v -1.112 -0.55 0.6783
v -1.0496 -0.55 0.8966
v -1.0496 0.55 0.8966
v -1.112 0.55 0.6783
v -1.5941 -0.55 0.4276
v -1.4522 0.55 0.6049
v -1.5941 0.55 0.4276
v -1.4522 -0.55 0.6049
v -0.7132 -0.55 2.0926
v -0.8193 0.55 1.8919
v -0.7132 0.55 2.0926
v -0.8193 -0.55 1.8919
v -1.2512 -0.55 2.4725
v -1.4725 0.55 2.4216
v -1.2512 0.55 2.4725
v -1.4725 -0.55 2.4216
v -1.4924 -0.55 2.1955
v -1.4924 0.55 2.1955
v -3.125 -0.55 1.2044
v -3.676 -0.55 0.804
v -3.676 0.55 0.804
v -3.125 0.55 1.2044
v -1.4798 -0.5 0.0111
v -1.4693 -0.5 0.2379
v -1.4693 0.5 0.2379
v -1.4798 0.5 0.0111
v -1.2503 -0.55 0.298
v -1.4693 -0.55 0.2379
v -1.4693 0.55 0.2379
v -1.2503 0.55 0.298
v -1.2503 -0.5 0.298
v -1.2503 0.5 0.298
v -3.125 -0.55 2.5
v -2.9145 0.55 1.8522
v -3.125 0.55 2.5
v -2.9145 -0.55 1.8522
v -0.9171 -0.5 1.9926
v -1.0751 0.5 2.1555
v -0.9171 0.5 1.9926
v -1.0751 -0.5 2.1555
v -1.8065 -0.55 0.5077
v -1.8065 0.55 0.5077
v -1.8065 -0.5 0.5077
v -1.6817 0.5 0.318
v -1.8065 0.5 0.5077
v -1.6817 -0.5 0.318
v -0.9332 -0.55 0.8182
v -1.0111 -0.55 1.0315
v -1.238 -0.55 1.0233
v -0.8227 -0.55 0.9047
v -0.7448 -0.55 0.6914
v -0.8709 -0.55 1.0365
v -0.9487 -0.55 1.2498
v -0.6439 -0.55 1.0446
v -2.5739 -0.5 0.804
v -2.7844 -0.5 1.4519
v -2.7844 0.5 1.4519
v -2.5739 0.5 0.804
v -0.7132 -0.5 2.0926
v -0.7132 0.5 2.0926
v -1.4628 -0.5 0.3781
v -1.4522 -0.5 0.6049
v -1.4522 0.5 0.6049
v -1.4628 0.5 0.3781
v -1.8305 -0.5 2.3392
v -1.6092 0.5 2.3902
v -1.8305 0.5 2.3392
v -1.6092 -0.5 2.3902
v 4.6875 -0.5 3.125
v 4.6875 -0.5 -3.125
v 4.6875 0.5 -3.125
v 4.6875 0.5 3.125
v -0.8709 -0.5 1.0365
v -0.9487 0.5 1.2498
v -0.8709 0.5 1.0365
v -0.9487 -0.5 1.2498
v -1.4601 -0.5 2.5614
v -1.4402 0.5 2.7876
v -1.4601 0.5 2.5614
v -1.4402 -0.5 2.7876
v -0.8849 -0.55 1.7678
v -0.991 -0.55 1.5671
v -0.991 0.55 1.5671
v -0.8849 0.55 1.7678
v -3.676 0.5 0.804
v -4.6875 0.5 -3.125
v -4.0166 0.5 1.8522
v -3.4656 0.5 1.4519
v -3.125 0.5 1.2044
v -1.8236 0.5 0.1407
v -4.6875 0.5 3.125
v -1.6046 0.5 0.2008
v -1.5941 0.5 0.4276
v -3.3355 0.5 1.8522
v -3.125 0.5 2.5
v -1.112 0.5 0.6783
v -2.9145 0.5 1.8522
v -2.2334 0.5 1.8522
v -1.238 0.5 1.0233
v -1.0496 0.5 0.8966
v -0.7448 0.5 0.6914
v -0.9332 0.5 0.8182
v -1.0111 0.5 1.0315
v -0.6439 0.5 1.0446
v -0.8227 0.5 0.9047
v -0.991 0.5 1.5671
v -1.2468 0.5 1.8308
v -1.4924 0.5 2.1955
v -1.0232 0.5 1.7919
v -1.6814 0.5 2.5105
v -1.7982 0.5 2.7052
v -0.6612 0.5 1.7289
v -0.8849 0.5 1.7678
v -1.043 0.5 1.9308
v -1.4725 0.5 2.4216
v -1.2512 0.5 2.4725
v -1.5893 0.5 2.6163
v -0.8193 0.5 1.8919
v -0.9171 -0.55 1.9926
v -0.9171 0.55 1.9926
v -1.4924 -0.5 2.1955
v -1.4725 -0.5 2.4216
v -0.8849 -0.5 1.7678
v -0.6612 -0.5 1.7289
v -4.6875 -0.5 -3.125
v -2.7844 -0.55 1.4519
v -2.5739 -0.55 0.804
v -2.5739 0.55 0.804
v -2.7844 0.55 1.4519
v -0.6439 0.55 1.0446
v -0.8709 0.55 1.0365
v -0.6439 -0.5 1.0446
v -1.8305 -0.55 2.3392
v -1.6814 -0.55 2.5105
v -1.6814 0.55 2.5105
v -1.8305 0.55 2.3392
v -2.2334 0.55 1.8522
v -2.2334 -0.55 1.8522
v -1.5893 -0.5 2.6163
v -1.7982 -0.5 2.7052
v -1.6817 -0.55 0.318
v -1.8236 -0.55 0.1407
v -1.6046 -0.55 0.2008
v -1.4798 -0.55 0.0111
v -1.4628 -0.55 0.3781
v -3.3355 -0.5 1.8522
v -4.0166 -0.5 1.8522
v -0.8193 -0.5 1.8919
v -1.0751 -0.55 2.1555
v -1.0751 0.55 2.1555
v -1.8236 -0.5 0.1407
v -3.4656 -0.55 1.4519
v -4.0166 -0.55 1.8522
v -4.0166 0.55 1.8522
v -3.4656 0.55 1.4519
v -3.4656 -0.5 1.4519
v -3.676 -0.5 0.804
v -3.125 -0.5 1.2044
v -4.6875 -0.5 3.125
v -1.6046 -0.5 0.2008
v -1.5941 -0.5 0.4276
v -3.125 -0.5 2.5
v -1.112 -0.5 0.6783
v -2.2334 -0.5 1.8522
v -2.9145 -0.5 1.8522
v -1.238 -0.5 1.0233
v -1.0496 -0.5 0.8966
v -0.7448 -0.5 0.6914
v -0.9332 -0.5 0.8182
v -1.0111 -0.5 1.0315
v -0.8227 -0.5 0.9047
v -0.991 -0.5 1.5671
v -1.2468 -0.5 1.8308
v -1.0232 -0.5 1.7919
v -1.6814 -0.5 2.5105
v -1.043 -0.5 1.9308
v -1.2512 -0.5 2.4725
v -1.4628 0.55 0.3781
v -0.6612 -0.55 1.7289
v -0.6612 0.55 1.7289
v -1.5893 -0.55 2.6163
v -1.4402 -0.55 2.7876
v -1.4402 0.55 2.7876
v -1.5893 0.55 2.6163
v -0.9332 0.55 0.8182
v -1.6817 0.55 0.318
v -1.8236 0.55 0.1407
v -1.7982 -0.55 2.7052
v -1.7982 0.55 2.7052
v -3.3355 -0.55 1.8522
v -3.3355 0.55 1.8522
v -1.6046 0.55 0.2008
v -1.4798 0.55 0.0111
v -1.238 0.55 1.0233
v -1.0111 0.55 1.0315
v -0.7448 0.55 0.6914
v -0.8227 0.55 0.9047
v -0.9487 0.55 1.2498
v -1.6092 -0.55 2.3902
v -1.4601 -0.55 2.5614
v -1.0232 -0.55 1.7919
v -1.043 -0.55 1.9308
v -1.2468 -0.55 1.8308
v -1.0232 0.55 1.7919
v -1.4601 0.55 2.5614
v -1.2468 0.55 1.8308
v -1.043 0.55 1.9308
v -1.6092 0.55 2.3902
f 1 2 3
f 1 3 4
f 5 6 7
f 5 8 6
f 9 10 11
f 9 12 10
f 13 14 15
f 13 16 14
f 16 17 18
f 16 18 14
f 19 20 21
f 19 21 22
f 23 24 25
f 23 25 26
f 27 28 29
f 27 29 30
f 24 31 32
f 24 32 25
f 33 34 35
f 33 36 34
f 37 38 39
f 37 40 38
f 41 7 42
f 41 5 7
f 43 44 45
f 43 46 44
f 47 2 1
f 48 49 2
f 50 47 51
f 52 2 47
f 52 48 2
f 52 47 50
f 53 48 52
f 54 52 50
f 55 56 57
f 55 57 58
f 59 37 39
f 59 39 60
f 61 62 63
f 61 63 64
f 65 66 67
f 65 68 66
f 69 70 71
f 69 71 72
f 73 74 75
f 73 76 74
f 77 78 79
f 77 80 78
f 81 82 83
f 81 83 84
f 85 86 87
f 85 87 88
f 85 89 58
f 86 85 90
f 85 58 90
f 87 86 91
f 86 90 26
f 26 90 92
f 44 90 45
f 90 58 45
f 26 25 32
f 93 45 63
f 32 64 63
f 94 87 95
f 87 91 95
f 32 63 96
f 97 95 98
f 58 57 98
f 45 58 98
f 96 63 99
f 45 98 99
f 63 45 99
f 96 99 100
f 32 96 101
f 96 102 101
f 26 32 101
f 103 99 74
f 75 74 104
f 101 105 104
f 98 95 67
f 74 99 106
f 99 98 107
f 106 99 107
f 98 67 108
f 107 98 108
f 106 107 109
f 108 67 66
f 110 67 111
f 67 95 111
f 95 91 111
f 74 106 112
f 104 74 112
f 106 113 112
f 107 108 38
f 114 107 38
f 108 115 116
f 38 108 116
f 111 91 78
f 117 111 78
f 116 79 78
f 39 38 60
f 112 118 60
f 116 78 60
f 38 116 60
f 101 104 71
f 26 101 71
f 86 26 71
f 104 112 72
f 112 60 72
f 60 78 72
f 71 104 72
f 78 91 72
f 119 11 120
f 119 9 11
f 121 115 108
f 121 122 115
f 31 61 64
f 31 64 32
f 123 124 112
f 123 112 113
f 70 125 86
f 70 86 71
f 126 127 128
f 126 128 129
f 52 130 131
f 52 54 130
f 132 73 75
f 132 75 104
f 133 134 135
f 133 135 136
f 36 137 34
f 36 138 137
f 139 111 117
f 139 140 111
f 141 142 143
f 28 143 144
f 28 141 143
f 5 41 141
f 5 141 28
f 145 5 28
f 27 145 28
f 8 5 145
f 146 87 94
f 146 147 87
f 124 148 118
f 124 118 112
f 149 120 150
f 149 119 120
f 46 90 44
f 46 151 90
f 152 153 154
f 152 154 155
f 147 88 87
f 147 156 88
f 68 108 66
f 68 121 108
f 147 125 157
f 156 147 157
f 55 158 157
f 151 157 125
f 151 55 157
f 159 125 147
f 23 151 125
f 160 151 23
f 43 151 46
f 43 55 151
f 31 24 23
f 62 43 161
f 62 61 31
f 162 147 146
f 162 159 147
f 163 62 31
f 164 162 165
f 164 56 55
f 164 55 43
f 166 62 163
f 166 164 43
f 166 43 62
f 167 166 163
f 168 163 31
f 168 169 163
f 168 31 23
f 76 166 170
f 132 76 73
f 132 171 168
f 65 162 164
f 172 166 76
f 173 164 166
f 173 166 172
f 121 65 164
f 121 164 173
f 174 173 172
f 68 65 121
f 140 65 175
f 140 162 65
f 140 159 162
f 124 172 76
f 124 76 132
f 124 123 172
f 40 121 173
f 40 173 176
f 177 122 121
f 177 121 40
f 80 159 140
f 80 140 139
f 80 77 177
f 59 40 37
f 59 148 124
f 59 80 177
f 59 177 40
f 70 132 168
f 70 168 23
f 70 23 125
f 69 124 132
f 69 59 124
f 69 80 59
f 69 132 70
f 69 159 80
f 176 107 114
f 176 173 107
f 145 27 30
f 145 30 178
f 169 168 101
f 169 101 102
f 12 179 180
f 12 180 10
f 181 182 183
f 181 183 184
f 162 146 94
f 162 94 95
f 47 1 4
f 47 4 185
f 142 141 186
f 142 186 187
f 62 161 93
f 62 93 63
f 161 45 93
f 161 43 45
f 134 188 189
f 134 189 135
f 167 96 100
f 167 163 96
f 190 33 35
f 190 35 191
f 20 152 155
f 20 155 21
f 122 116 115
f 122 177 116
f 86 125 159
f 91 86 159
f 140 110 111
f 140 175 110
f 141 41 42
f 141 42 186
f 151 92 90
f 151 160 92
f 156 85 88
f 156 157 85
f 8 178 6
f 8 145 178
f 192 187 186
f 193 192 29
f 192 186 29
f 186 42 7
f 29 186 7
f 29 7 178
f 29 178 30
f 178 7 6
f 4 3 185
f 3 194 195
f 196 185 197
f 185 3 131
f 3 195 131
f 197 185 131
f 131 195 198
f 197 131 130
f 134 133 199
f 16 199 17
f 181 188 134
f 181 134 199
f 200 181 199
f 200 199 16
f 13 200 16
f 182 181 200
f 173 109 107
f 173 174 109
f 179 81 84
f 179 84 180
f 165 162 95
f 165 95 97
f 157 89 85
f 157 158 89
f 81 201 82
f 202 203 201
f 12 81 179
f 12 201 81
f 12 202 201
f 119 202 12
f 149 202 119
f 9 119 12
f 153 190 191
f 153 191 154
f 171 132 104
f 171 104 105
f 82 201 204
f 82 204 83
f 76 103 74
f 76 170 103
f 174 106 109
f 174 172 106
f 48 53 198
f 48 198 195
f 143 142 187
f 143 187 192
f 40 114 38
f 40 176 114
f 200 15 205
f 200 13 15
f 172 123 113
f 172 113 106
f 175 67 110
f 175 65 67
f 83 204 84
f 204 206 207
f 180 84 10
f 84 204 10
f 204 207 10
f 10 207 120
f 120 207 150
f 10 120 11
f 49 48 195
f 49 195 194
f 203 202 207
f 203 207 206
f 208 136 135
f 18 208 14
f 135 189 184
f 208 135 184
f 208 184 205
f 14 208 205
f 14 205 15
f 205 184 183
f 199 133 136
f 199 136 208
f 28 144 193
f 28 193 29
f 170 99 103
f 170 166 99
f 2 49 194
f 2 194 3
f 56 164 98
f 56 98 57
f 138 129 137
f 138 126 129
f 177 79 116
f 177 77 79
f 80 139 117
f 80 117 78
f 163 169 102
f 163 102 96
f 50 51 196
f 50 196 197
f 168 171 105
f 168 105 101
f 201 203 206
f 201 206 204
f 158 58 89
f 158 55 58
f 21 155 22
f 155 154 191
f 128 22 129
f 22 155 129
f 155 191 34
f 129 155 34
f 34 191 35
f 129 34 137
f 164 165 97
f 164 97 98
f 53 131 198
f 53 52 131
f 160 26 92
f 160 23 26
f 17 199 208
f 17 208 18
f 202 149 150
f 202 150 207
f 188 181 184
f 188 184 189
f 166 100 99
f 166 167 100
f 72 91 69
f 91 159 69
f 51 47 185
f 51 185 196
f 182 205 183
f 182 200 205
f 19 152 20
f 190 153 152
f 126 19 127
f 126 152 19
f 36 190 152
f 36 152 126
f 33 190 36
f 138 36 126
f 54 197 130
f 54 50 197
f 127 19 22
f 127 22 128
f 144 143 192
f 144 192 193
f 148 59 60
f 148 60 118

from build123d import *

# Parameters (mm, degrees)
F0_W     = 9.375
F0_H     = 6.25
F1_DEPTH = 0.5
F2_DEPTH = 0.55


with BuildPart() as f1:
    # F0 (on Front) → F1 (new body, symmetric)
    with BuildSketch(Plane.XZ):
        Rectangle(F0_W, F0_H)
        Polygon((-1.5940887542, 0.4276162778), (-1.45225, 0.60493), (-1.4627809703, 0.3781111587), (-1.25032, 0.29801), (-1.4692891501, 0.2379362482), (-1.47982, 0.01112), (-1.6046177776, 0.2008091077), (-1.82357, 0.14074), (-1.6817436333, 0.3180382365), (-1.80653, 0.50771), align=None, mode=Mode.SUBTRACT)
        Polygon((-0.8708636636, 1.0365052502), (-0.64393, 1.04465), (-0.8227314344, 0.9046887114), (-0.74485, 0.6914), (-0.933221672, 0.8181997183), (-1.11197, 0.67828), (-1.0496266799, 0.8965560977), (-1.23796, 1.02333), (-1.011092323, 1.0314723815), (-0.94874, 1.24978), align=None, mode=Mode.SUBTRACT)
        Polygon((-3.3354794214, 1.85221), (-3.125, 2.5), (-2.914516759, 1.85221), (-2.2334, 1.85221), (-2.7844309261, 1.4518536518), (-2.57394, 0.80404), (-3.1249971008, 1.204412313), (-3.67605, 0.80404), (-3.4655634626, 1.4518519009), (-4.016601, 1.85221), align=None, mode=Mode.SUBTRACT)
        Polygon((-0.9170624909, 1.9925929856), (-0.71322, 2.09261), (-0.8193476982, 1.8918681334), (-0.66124, 1.72889), (-0.8849342003, 1.7678104455), (-0.99104, 1.56711), (-1.0231619648, 1.7918606272), (-1.24685, 1.83078), (-1.043018366, 1.9307916874), (-1.07514, 2.15554), align=None, mode=Mode.SUBTRACT)
        Polygon((-1.5892924054, 2.6163223665), (-1.44021, 2.7876), (-1.460146995, 2.5614016312), (-1.25119, 2.47254), (-1.4724668983, 2.421624196), (-1.4924, 2.19547), (-1.6092180103, 2.3901577715), (-1.83046, 2.33925), (-1.681416449, 2.5104829945), (-1.79824, 2.70518), align=None, mode=Mode.SUBTRACT)
    extrude(amount=F1_DEPTH, both=True)


with BuildPart() as f2:
    # F0 (on Front) → F2 (new body, symmetric)
    with BuildSketch(Plane.XZ):
        Polygon((-2.7844309261, 1.4518536518), (-2.914516759, 1.85221), (-3.3354794214, 1.85221), (-3.4655634626, 1.4518519009), (-3.1249971008, 1.204412313), align=None)
        Polygon((-2.914516759, 1.85221), (-3.125, 2.5), (-3.3354794214, 1.85221), align=None)
        Polygon((-2.2334, 1.85221), (-2.914516759, 1.85221), (-2.7844309261, 1.4518536518), align=None)
        Polygon((-3.4655634626, 1.4518519009), (-3.3354794214, 1.85221), (-4.016601, 1.85221), align=None)
        Polygon((-3.1249971008, 1.204412313), (-3.4655634626, 1.4518519009), (-3.67605, 0.80404), align=None)
        Polygon((-2.57394, 0.80404), (-2.7844309261, 1.4518536518), (-3.1249971008, 1.204412313), align=None)
    extrude(amount=F2_DEPTH, both=True)


with BuildPart() as f2b:
    # F0 (on Front) → F2, piece 2 (new body, symmetric)
    with BuildSketch(Plane.XZ):
        Polygon((-1.6817436333, 0.3180382365), (-1.5940887542, 0.4276162778), (-1.80653, 0.50771), align=None)
        Polygon((-1.4627809703, 0.3781111587), (-1.45225, 0.60493), (-1.5940887542, 0.4276162778), align=None)
        Polygon((-1.25032, 0.29801), (-1.4627809703, 0.3781111587), (-1.4692891501, 0.2379362482), align=None)
        Polygon((-1.47982, 0.01112), (-1.4692891501, 0.2379362482), (-1.6046177776, 0.2008091077), align=None)
        Polygon((-1.4692891501, 0.2379362482), (-1.4627809703, 0.3781111587), (-1.5940887542, 0.4276162778), (-1.6817436333, 0.3180382365), (-1.6046177776, 0.2008091077), align=None)
        Polygon((-1.6046177776, 0.2008091077), (-1.6817436333, 0.3180382365), (-1.82357, 0.14074), align=None)
    extrude(amount=F2_DEPTH, both=True)


with BuildPart() as f2c:
    # F0 (on Front) → F2, piece 3 (new body, symmetric)
    with BuildSketch(Plane.XZ):
        Polygon((-0.933221672, 0.8181997183), (-0.8227314344, 0.9046887114), (-0.8708636636, 1.0365052502), (-1.011092323, 1.0314723815), (-1.0496266799, 0.8965560977), align=None)
        Polygon((-0.74485, 0.6914), (-0.8227314344, 0.9046887114), (-0.933221672, 0.8181997183), align=None)
        Polygon((-1.11197, 0.67828), (-0.933221672, 0.8181997183), (-1.0496266799, 0.8965560977), align=None)
        Polygon((-1.011092323, 1.0314723815), (-0.8708636636, 1.0365052502), (-0.94874, 1.24978), align=None)
        Polygon((-1.0496266799, 0.8965560977), (-1.011092323, 1.0314723815), (-1.23796, 1.02333), align=None)
        Polygon((-0.8227314344, 0.9046887114), (-0.64393, 1.04465), (-0.8708636636, 1.0365052502), align=None)
    extrude(amount=F2_DEPTH, both=True)


with BuildPart() as f2d:
    # F0 (on Front) → F2, piece 4 (new body, symmetric)
    with BuildSketch(Plane.XZ):
        Polygon((-1.043018366, 1.9307916874), (-0.9170624909, 1.9925929856), (-1.07514, 2.15554), align=None)
        Polygon((-0.8193476982, 1.8918681334), (-0.71322, 2.09261), (-0.9170624909, 1.9925929856), align=None)
        Polygon((-0.8849342003, 1.7678104455), (-0.8193476982, 1.8918681334), (-0.9170624909, 1.9925929856), (-1.043018366, 1.9307916874), (-1.0231619648, 1.7918606272), align=None)
        Polygon((-0.66124, 1.72889), (-0.8193476982, 1.8918681334), (-0.8849342003, 1.7678104455), align=None)
        Polygon((-0.99104, 1.56711), (-0.8849342003, 1.7678104455), (-1.0231619648, 1.7918606272), align=None)
        Polygon((-1.0231619648, 1.7918606272), (-1.043018366, 1.9307916874), (-1.24685, 1.83078), align=None)
    extrude(amount=F2_DEPTH, both=True)


with BuildPart() as f2e:
    # F0 (on Front) → F2, piece 5 (new body, symmetric)
    with BuildSketch(Plane.XZ):
        Polygon((-1.460146995, 2.5614016312), (-1.44021, 2.7876), (-1.5892924054, 2.6163223665), align=None)
        Polygon((-1.4724668983, 2.421624196), (-1.460146995, 2.5614016312), (-1.5892924054, 2.6163223665), (-1.681416449, 2.5104829945), (-1.6092180103, 2.3901577715), align=None)
        Polygon((-1.681416449, 2.5104829945), (-1.5892924054, 2.6163223665), (-1.79824, 2.70518), align=None)
        Polygon((-1.6092180103, 2.3901577715), (-1.681416449, 2.5104829945), (-1.83046, 2.33925), align=None)
        Polygon((-1.4924, 2.19547), (-1.4724668983, 2.421624196), (-1.6092180103, 2.3901577715), align=None)
        Polygon((-1.25119, 2.47254), (-1.460146995, 2.5614016312), (-1.4724668983, 2.421624196), align=None)
    extrude(amount=F2_DEPTH, both=True)


solid = Compound([f1.part, f2.part, f2b.part, f2c.part, f2d.part, f2e.part])
